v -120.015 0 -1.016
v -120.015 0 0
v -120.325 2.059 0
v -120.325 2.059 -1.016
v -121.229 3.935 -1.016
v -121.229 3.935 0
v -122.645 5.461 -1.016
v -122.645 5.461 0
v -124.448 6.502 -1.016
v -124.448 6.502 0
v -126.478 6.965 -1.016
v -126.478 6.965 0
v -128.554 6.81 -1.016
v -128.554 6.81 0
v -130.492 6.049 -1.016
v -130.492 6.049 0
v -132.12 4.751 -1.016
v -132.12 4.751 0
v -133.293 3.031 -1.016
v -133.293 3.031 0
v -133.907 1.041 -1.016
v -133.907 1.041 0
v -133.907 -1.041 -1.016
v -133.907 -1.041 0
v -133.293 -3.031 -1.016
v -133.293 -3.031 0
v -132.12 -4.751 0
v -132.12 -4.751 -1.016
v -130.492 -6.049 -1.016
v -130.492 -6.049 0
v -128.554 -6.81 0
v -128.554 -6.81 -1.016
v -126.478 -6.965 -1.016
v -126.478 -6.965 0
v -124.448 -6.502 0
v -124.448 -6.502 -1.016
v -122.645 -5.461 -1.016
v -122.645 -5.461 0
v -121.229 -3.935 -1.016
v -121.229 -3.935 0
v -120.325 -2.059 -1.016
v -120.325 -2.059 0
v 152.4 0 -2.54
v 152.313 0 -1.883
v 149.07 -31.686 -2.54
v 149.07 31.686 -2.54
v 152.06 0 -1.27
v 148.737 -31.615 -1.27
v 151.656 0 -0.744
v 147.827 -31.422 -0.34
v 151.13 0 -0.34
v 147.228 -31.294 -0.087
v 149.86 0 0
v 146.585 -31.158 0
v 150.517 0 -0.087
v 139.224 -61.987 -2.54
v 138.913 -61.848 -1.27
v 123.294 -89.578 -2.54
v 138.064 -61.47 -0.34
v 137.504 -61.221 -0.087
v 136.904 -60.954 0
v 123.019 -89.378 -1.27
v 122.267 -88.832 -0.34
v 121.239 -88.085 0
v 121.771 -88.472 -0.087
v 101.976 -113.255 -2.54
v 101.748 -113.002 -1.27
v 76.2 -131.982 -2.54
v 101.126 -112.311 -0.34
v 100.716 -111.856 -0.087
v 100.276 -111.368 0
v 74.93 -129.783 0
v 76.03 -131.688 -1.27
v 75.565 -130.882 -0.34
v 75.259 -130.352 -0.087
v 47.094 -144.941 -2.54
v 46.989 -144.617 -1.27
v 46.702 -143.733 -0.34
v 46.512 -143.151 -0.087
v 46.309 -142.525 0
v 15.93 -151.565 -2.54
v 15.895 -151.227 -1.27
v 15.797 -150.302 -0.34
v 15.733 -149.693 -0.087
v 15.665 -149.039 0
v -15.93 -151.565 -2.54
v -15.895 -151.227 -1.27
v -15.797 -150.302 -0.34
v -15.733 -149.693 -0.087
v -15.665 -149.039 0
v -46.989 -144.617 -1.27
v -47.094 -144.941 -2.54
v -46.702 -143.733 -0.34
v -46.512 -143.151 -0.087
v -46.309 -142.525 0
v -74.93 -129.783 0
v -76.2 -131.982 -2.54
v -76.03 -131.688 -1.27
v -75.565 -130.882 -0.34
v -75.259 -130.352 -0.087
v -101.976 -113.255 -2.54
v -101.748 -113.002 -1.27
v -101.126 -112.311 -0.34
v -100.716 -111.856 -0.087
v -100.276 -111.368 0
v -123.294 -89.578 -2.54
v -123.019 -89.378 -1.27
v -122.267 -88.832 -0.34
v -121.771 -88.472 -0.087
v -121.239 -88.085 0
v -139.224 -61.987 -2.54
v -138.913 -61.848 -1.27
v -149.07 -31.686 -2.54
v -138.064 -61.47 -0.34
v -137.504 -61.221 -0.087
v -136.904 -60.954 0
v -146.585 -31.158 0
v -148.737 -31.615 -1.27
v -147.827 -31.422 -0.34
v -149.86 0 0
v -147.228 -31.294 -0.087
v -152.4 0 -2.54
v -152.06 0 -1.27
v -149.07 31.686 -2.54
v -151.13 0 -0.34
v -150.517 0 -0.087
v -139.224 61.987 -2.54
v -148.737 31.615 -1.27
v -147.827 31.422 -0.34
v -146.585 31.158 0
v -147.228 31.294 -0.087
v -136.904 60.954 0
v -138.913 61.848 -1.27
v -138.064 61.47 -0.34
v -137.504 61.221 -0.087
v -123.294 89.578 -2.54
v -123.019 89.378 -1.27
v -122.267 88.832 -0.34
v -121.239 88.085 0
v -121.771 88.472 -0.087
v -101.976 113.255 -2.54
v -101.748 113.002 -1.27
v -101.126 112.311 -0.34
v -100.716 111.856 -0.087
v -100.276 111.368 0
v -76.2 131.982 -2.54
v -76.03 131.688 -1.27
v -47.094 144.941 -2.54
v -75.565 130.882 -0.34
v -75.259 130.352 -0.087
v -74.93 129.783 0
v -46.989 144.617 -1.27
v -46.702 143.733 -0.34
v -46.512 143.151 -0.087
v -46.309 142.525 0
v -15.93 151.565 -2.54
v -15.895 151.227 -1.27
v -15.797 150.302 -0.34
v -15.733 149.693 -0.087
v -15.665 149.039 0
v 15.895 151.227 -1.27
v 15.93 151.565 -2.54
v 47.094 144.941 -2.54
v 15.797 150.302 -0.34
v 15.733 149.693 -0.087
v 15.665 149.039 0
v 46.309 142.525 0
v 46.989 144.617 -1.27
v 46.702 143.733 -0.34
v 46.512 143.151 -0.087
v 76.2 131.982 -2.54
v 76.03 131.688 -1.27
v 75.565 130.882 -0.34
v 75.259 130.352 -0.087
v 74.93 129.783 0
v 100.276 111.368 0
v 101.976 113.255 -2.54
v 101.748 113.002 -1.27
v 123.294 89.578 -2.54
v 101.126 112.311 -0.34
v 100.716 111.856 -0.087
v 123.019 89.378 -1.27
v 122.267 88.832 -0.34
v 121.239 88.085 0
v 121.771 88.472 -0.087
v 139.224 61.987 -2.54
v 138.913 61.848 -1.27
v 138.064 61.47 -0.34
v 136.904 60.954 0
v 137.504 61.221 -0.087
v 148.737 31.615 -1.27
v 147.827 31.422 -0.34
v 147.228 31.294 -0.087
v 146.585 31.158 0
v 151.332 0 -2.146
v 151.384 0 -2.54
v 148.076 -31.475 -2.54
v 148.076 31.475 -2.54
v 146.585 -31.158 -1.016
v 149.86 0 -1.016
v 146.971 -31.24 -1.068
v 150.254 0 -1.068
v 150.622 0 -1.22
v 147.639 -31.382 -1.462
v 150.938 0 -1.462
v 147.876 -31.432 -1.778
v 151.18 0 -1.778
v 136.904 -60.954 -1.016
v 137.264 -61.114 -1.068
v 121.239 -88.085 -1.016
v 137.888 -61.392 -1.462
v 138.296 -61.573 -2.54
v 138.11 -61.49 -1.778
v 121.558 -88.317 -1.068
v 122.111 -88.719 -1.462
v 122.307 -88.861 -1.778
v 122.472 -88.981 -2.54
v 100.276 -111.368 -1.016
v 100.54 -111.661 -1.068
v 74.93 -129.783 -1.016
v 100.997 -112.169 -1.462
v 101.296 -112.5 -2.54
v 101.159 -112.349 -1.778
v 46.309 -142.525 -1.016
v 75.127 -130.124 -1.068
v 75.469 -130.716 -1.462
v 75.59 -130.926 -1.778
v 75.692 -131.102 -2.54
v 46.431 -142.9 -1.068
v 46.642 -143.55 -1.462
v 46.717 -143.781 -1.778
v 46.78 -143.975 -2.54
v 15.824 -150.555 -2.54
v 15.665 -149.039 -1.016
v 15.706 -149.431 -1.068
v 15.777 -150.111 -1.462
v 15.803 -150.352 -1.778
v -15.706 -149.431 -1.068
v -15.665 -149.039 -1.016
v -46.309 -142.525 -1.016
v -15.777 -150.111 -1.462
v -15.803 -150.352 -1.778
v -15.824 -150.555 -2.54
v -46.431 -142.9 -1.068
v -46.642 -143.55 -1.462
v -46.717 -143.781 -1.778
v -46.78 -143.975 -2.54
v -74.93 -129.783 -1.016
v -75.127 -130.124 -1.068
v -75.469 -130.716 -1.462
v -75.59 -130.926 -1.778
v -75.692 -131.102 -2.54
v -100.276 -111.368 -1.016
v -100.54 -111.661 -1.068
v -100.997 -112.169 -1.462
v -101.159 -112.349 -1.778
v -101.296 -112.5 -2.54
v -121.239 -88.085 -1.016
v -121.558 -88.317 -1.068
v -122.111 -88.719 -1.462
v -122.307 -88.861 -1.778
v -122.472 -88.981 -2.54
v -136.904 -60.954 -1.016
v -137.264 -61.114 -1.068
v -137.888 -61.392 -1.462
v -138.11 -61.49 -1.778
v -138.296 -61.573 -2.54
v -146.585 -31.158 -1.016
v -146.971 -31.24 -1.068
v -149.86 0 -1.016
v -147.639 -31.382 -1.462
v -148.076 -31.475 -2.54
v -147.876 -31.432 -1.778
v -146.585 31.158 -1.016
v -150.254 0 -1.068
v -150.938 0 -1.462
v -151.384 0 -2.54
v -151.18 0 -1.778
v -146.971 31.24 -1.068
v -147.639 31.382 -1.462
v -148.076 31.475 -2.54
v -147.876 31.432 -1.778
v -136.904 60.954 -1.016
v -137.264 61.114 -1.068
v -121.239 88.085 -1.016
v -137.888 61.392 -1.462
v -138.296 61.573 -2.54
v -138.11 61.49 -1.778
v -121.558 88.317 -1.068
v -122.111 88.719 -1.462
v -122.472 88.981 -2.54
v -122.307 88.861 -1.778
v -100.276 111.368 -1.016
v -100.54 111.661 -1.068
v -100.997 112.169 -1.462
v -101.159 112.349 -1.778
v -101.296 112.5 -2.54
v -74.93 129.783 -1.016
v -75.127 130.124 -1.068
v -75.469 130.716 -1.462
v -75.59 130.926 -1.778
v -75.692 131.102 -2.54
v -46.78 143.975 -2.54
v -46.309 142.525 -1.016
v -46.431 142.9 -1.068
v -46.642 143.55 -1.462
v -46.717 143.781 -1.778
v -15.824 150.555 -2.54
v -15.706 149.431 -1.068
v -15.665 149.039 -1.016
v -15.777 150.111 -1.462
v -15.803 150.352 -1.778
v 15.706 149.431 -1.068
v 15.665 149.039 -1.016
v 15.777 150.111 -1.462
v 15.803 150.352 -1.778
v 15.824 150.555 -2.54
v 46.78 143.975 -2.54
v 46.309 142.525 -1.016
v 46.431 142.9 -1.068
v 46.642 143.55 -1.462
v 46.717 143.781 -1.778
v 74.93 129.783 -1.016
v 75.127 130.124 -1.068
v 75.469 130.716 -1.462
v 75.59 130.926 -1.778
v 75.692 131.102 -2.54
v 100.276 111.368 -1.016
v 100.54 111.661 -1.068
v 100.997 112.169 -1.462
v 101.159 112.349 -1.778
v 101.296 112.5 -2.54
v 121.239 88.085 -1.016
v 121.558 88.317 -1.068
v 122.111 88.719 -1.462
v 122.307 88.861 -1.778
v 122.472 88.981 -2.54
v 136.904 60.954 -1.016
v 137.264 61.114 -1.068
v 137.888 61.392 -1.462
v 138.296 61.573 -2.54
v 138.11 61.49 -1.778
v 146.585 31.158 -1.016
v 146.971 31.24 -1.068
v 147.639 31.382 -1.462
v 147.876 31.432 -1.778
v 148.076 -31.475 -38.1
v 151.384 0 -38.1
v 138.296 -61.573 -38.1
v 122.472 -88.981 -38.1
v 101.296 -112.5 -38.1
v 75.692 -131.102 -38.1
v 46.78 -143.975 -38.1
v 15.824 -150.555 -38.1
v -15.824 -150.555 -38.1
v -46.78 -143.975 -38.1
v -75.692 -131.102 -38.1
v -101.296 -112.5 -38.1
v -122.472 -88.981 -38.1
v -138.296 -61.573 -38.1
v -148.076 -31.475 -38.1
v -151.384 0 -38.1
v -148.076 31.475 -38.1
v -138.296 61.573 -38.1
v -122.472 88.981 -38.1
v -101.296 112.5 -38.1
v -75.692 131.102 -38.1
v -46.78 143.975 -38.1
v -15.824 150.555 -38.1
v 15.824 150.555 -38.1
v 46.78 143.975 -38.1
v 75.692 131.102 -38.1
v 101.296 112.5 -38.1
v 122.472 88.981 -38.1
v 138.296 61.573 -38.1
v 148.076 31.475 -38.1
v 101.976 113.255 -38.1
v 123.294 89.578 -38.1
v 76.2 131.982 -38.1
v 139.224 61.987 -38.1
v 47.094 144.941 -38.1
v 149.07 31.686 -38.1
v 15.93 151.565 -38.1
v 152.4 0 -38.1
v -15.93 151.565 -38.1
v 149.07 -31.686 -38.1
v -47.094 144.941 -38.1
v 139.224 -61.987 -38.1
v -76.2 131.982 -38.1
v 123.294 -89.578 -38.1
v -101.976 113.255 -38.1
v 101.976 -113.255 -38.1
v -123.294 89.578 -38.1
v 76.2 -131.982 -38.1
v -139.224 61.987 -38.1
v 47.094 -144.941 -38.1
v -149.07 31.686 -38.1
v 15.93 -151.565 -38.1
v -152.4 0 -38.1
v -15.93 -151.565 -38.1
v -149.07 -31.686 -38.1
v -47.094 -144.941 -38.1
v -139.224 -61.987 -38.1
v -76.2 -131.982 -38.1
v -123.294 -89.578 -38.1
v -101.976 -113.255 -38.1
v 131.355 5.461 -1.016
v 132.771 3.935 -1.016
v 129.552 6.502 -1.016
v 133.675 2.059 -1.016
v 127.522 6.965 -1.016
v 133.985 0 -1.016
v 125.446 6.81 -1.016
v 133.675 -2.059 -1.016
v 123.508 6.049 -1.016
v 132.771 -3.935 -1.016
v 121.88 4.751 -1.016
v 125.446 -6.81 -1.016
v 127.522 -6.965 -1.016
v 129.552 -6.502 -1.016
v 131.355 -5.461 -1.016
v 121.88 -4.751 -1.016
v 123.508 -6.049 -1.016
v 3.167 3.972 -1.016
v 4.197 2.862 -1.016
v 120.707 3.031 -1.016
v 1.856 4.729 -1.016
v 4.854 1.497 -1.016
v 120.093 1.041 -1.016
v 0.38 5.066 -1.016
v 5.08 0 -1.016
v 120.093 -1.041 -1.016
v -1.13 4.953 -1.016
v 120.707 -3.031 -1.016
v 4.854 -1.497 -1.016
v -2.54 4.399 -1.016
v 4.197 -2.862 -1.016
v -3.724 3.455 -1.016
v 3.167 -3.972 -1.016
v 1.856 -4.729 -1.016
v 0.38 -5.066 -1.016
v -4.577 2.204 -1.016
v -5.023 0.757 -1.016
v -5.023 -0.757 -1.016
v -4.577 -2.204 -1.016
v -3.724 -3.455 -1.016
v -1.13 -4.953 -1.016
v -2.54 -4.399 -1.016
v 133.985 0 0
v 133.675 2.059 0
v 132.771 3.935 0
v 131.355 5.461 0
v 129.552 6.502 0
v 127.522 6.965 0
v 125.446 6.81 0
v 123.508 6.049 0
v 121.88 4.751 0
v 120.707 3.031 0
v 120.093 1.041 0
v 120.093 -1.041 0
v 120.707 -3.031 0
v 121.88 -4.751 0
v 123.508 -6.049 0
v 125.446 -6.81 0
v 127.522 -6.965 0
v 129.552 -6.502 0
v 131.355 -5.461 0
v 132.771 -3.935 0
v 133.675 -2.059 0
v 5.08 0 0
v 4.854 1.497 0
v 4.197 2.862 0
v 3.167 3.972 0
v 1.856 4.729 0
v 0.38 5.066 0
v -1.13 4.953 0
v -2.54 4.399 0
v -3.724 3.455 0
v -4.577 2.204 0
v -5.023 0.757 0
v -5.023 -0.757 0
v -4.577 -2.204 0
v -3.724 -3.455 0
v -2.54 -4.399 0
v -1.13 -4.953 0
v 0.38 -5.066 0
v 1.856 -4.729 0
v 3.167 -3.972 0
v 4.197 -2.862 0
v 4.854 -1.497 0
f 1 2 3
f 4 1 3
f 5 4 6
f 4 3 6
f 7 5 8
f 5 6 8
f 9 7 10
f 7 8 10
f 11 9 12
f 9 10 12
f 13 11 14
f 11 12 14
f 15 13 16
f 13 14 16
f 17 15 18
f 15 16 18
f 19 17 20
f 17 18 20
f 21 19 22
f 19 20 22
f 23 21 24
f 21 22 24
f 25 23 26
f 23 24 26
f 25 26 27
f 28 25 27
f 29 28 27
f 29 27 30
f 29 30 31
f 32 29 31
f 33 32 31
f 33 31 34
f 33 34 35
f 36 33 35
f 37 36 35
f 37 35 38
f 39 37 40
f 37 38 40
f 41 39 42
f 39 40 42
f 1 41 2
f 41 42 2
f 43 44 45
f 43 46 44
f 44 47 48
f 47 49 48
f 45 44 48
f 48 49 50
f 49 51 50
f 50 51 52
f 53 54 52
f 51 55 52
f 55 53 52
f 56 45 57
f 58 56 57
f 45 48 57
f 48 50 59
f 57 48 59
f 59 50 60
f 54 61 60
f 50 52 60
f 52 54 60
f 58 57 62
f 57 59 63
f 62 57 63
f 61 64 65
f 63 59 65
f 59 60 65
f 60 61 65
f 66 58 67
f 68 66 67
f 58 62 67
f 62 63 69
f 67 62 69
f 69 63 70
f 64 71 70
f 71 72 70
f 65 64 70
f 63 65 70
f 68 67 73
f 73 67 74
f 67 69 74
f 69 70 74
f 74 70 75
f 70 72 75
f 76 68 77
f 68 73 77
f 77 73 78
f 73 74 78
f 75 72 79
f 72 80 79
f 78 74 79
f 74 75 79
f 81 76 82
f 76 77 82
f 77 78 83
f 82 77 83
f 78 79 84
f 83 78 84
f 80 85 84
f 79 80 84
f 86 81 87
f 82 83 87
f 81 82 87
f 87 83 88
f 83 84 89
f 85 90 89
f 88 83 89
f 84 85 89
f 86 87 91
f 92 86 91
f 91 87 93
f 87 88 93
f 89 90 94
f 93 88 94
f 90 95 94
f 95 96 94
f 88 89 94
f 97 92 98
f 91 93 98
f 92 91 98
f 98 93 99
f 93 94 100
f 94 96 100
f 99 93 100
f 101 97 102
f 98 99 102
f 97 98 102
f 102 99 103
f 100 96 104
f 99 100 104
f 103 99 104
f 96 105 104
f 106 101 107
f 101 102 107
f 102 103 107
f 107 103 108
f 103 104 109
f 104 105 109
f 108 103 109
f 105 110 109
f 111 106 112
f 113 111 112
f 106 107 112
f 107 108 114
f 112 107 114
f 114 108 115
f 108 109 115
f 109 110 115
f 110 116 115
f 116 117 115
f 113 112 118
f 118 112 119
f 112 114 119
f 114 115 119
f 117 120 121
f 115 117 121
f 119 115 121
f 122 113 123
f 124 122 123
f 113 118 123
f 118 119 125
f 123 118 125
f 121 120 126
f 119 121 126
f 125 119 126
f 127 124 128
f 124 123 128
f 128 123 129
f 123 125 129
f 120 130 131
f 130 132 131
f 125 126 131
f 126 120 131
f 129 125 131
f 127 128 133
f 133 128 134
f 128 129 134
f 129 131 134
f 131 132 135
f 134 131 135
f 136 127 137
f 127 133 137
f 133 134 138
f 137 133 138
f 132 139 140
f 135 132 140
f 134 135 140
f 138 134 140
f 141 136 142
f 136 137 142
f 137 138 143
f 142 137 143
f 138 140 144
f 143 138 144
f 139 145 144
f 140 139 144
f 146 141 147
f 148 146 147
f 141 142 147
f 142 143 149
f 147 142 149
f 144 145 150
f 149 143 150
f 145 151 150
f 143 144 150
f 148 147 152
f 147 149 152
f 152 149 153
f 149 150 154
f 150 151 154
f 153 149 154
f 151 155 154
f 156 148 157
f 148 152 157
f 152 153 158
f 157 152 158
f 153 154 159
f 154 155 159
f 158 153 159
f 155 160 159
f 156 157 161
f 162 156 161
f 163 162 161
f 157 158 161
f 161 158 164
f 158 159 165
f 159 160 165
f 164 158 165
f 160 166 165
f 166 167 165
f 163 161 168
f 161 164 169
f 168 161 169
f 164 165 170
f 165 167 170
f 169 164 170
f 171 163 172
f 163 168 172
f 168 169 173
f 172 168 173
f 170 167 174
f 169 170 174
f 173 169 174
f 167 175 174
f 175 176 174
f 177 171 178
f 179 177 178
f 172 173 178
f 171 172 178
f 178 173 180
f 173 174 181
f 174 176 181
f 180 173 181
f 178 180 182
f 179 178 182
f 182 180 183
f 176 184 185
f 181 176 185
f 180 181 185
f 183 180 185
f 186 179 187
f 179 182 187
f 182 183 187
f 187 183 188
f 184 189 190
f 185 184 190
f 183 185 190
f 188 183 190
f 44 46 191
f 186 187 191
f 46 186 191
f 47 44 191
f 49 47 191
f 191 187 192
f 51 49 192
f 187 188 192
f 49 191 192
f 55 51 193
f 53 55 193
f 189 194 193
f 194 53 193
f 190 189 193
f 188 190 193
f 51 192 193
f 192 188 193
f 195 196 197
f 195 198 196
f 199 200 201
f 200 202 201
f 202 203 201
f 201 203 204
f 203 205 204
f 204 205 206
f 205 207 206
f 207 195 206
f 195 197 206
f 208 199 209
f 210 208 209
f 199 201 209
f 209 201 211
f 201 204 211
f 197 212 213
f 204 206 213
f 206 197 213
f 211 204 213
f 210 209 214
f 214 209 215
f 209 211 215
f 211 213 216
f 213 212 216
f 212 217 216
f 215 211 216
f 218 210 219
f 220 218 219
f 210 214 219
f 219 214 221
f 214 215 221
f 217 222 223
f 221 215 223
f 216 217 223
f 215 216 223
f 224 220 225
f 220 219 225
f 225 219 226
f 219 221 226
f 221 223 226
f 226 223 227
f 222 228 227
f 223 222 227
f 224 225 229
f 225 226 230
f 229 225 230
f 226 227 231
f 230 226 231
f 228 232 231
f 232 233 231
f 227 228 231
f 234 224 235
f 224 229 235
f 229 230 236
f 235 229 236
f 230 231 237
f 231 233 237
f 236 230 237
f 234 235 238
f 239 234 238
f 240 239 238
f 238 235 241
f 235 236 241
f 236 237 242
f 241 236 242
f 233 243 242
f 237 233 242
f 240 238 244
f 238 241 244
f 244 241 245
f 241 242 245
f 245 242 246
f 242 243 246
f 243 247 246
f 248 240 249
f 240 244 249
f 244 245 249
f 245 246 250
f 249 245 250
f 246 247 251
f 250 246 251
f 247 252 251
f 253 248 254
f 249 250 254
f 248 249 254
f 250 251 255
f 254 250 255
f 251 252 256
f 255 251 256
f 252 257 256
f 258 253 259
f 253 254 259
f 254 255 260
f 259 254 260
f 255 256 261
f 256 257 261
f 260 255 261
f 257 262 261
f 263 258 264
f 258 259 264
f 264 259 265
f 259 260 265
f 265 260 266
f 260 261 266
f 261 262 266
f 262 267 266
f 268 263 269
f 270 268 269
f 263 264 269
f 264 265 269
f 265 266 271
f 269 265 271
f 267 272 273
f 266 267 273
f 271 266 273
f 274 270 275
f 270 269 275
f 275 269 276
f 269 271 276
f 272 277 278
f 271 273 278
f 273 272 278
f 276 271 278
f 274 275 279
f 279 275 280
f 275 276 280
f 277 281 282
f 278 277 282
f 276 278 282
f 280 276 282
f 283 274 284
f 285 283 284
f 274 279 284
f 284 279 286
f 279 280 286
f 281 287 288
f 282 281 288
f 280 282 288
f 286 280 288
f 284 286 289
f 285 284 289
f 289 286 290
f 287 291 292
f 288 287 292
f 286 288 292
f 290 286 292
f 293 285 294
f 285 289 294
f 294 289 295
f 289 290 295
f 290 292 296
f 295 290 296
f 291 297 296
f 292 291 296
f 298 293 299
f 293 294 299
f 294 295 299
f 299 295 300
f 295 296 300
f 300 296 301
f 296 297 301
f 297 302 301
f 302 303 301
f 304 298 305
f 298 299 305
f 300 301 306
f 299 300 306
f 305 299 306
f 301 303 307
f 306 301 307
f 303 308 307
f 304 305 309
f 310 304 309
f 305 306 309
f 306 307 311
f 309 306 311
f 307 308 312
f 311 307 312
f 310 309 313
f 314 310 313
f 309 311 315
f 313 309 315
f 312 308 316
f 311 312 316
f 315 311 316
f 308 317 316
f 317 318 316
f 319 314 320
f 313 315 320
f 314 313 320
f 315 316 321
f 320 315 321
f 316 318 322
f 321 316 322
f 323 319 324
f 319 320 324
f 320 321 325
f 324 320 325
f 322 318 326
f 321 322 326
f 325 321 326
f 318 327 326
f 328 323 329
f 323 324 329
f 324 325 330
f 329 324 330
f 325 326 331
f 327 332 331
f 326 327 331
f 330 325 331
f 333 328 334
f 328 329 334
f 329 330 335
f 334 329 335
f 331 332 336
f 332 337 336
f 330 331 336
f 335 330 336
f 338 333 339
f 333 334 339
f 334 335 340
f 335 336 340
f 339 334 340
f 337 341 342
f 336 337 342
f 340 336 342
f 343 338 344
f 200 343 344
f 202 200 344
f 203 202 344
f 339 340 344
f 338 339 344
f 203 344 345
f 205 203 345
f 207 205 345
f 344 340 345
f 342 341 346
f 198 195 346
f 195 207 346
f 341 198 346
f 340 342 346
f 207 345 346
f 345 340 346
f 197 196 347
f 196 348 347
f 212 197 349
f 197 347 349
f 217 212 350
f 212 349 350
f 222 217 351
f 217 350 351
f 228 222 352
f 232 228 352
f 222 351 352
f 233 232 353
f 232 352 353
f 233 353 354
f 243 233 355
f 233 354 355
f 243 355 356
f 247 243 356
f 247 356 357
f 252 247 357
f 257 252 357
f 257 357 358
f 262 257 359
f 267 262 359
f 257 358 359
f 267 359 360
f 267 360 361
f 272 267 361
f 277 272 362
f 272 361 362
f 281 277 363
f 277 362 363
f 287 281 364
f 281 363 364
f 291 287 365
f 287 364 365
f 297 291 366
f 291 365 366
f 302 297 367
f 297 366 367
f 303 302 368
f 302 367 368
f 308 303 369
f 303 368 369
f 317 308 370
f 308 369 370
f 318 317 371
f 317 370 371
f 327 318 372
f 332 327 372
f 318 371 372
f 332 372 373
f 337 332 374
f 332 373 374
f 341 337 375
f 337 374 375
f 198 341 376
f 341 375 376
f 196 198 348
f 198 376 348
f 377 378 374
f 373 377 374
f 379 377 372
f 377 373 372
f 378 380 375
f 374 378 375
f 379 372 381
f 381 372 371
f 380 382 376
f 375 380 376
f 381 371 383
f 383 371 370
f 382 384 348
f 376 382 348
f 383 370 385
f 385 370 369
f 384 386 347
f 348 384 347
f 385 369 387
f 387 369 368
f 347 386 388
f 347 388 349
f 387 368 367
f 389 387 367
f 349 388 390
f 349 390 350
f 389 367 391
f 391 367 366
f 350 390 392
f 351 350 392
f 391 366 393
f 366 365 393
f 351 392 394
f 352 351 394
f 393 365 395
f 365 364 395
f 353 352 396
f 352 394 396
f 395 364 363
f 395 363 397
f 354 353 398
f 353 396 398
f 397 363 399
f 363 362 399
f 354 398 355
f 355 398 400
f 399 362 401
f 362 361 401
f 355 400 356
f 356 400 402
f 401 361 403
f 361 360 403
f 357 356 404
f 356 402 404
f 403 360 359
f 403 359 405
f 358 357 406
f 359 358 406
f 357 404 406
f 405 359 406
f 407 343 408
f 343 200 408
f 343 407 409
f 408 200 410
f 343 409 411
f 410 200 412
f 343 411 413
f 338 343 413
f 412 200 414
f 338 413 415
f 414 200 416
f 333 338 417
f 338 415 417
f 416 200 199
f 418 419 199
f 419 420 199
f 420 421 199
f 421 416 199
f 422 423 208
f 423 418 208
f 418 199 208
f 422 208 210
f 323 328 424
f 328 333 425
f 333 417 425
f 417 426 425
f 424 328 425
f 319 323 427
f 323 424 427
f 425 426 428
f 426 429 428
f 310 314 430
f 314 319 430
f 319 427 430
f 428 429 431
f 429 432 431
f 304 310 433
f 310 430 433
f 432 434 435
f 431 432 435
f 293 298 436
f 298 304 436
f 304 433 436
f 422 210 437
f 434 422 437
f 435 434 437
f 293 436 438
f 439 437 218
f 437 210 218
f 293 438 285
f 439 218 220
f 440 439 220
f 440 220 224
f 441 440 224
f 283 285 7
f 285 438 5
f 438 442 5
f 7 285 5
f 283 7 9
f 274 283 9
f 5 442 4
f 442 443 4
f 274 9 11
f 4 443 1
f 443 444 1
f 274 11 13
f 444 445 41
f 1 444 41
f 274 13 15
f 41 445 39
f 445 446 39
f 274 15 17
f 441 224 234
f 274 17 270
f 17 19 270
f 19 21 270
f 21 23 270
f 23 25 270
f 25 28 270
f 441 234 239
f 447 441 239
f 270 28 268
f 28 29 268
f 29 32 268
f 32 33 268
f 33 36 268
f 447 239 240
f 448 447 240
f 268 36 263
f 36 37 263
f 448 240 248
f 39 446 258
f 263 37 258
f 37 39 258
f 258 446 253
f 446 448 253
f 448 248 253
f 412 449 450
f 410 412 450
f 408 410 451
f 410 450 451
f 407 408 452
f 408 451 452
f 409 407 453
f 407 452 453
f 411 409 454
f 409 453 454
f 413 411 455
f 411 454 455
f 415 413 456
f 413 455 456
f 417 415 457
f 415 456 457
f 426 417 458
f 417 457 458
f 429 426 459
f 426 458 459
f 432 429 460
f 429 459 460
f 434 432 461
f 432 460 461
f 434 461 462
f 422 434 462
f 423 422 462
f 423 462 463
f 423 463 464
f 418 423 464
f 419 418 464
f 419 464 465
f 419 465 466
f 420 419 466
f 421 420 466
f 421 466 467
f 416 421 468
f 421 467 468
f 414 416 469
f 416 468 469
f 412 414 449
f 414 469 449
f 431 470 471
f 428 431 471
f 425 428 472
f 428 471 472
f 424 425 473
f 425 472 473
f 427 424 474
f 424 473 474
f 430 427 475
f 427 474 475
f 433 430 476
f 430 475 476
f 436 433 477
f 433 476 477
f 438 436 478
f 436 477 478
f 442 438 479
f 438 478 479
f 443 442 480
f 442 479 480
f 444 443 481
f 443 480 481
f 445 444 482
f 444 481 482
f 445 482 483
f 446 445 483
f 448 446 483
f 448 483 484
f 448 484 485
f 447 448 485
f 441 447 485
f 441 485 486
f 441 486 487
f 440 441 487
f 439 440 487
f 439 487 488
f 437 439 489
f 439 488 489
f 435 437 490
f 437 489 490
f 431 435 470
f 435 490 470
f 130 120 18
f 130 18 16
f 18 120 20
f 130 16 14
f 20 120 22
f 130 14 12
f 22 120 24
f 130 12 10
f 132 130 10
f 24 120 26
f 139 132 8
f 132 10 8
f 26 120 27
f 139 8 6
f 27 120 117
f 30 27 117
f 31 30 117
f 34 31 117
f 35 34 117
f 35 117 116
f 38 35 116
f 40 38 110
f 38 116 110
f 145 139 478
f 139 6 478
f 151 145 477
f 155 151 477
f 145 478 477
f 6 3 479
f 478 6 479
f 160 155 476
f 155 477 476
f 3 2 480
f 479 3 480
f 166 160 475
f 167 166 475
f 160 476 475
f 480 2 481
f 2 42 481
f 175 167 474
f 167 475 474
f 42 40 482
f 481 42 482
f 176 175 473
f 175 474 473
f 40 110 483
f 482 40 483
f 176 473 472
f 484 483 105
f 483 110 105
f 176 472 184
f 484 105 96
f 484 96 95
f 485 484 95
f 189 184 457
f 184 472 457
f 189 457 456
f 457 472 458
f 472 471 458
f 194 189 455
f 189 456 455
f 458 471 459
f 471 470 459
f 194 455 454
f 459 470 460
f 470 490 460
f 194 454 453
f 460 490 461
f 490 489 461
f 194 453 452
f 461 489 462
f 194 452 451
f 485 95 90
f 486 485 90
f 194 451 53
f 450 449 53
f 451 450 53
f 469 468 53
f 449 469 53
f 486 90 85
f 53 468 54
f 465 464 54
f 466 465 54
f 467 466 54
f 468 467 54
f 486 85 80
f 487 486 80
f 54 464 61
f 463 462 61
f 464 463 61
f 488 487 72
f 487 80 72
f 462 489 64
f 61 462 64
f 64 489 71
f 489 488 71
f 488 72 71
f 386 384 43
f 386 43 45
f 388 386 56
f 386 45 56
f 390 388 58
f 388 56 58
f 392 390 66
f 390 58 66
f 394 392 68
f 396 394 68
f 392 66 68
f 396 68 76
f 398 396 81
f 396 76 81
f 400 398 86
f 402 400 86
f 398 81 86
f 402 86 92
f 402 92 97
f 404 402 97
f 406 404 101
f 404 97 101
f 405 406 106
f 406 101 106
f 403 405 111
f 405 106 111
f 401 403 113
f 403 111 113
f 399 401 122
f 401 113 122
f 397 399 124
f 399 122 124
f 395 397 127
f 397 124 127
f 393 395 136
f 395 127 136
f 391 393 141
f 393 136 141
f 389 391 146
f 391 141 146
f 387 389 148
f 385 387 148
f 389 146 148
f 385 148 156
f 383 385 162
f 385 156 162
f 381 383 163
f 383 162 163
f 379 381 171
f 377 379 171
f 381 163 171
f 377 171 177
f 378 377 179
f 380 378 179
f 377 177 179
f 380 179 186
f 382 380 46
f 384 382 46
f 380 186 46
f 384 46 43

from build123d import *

# Parameters (mm, degrees)
F3_R     = 6.985
F3_R_2   = 5.08
F4_DEPTH = 1.016


with BuildPart() as f2:
    # F1 (on Front) → F2 (revolve)
    with BuildSketch(Plane.XZ):
        with BuildLine():
            Line((149.86, 0), (0, 0))
            Line((0, 0), (0, -1.016))
            Line((0, -1.016), (149.86, -1.016))
            ThreePointArc((149.86, -1.016), (150.937631, -1.462369), (151.384, -2.54))
            Line((151.384, -2.54), (151.384, -38.1))
            Line((151.384, -38.1), (152.4, -38.1))
            Line((152.4, -38.1), (152.4, -2.54))
            ThreePointArc((152.4, -2.54), (151.656051, -0.743949), (149.86, 0))
        make_face()
    revolve(axis=Axis((0, 0, -9.205109), (0, 0, -1)))

    # F3 (on face) → F4 (cut, through all)
    with BuildSketch(Plane.XY):
        with Locations((127, 0)):
            Circle(F3_R)
        with Locations((-127, 0)):
            Circle(F3_R)
        Circle(F3_R_2)
    extrude(amount=-F4_DEPTH, mode=Mode.SUBTRACT)


solid = f2.part
